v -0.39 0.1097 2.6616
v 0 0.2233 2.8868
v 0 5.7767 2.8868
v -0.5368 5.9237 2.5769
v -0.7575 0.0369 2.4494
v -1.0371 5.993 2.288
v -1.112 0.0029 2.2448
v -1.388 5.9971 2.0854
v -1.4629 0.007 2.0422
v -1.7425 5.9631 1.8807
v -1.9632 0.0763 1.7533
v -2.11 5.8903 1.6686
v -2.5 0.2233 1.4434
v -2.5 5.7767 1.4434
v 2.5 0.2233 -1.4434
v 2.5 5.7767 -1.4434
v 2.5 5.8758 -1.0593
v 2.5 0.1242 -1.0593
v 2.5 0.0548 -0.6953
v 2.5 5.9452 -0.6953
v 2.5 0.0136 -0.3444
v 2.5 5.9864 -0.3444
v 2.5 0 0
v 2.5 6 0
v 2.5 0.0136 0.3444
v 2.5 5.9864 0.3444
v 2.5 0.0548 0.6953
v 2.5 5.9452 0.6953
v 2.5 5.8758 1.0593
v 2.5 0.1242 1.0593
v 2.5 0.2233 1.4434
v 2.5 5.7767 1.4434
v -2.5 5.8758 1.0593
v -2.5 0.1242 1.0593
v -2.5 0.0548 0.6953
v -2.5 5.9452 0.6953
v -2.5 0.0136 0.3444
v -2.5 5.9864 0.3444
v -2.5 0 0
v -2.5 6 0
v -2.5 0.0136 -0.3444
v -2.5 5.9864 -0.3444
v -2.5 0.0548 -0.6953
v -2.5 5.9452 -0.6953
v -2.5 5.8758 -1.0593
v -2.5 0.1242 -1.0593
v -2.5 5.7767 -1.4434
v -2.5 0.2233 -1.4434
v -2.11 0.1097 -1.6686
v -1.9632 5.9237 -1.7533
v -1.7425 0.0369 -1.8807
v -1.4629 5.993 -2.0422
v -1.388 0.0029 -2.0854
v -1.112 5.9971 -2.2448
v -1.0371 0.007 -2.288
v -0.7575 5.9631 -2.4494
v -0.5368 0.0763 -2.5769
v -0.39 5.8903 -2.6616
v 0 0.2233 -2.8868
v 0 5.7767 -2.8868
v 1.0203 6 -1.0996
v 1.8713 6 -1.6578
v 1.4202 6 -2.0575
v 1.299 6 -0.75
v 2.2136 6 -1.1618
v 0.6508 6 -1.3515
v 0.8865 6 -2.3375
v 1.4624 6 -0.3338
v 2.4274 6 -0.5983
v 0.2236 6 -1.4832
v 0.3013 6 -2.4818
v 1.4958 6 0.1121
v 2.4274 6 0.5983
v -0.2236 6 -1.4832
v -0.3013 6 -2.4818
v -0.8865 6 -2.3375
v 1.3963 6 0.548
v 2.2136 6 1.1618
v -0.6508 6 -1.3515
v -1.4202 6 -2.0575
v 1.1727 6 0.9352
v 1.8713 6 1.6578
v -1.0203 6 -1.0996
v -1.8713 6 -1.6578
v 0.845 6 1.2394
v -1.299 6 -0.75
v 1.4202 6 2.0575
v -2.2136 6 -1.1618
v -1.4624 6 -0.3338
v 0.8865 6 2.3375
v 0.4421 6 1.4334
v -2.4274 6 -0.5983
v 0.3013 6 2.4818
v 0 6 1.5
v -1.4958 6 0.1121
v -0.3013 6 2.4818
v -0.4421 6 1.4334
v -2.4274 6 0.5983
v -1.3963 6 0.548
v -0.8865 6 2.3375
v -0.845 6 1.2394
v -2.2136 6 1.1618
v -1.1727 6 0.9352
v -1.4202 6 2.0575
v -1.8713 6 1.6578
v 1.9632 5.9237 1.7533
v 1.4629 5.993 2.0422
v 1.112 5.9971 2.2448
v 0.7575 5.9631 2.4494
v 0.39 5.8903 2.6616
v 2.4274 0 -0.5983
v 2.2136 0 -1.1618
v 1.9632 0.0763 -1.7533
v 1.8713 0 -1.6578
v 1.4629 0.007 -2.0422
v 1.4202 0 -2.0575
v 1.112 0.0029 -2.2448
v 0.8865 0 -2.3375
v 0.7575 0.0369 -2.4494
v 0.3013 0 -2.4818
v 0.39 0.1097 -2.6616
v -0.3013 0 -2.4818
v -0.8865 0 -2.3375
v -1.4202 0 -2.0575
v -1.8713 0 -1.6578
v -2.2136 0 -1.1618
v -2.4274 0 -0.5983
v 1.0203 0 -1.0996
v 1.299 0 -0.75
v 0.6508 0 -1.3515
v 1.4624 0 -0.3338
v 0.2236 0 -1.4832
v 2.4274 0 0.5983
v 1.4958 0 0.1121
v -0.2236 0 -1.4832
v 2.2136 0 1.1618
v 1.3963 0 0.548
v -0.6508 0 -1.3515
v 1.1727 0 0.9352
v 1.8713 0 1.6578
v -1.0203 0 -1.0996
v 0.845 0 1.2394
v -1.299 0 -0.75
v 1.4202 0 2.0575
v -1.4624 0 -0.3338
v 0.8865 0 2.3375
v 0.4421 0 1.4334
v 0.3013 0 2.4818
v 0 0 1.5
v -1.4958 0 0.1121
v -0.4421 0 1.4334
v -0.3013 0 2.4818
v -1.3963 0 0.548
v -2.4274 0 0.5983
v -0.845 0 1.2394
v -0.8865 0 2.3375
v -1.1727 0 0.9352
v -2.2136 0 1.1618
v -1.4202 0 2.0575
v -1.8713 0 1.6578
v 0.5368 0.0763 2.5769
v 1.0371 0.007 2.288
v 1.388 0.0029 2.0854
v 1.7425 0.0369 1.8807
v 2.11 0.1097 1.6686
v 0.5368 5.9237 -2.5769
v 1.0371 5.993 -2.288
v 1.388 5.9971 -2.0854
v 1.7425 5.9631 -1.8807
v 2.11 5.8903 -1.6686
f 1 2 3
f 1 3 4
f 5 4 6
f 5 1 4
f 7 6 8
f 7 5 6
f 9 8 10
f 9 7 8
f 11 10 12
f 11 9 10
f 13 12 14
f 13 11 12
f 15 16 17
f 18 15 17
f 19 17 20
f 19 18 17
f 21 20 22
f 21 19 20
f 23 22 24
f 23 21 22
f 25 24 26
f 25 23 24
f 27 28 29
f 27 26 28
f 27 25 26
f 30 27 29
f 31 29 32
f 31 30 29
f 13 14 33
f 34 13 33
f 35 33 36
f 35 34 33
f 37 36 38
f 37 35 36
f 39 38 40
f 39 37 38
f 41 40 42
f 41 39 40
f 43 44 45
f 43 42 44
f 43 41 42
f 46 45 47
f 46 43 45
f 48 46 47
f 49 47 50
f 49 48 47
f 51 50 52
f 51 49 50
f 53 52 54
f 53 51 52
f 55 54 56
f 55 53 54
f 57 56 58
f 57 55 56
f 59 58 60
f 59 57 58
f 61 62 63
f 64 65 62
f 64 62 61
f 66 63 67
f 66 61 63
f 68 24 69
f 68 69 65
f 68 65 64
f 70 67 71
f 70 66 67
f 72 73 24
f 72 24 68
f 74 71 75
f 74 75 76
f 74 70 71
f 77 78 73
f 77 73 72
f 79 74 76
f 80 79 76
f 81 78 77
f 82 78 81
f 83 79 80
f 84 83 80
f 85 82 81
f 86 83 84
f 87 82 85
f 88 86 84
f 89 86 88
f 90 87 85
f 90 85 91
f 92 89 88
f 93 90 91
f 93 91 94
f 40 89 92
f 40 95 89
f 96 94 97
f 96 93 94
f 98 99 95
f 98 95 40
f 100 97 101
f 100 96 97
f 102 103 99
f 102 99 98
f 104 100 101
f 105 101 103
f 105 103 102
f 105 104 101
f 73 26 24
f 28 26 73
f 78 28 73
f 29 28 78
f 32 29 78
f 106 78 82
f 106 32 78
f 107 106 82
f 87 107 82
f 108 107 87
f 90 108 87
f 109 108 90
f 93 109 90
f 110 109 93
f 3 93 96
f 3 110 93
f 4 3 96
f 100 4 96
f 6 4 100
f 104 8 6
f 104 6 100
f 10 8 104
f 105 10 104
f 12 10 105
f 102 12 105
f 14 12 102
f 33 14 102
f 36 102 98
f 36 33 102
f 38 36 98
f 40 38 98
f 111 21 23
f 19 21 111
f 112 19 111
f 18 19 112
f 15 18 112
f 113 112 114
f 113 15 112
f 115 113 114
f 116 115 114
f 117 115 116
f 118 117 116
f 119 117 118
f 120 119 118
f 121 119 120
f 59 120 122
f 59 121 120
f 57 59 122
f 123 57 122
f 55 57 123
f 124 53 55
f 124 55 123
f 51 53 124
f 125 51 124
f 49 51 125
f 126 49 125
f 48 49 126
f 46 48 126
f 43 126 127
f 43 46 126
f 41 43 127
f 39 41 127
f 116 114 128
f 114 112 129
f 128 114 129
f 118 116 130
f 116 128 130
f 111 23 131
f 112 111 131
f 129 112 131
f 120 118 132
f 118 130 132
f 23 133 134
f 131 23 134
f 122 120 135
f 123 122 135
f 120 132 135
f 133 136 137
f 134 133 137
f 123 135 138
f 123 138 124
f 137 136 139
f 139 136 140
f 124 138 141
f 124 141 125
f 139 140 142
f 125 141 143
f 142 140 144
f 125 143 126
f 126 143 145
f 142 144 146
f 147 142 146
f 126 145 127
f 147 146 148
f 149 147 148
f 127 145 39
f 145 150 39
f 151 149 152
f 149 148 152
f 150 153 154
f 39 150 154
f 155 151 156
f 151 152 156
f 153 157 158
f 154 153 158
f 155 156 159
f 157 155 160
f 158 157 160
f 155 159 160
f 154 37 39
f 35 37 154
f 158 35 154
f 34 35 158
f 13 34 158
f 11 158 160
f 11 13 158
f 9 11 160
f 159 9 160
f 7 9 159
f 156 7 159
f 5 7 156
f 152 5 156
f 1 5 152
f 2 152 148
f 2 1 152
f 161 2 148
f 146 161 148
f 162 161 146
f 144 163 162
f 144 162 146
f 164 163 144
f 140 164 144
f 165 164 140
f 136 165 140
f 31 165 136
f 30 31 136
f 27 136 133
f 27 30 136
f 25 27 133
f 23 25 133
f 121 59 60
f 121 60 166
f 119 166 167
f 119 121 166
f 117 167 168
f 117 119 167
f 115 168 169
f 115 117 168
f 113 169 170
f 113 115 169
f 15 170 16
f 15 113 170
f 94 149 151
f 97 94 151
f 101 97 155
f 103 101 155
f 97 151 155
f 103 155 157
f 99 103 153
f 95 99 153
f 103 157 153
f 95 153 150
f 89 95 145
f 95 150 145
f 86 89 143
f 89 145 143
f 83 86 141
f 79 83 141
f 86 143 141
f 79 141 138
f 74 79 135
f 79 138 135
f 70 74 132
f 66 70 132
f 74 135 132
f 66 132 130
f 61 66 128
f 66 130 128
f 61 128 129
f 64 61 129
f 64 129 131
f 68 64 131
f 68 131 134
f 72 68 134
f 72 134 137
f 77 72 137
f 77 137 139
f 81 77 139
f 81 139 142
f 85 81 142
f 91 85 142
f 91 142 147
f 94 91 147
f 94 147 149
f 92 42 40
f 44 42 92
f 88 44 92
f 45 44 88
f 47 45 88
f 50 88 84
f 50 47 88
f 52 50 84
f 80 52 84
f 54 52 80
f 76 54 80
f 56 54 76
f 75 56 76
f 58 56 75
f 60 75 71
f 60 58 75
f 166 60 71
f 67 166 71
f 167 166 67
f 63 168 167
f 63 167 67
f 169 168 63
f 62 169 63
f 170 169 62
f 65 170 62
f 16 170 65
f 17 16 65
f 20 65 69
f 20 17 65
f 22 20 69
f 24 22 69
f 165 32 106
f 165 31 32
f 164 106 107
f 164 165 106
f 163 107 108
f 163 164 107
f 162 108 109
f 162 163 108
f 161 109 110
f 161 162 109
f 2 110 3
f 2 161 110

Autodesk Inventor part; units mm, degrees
ref_plane "YZ Plane" through (0, 0, 0) normal (1, 0, 0) x (0, 1, 0)
ref_plane "XZ Plane" through (0, 0, 0) normal (0, 1, 0) x (-1, 0, 0)
ref_plane "XY Plane" through (0, 0, 0) normal (0, 0, 1) x (1, 0, 0)
sketch "Sketch1" plane through (0, 0, 0) normal (0, 1, 0) x (-1, 0, 0)
  line L0 (0, -2.8868) -> (-2.5, -1.4434)
  line L1 (-2.5, -1.4434) -> (-2.5, 1.4434)
  line L2 (-2.5, 1.4434) -> (0, 2.8868)
  line L3 (0, 2.8868) -> (2.5, 1.4434)
  line L4 (2.5, 1.4434) -> (2.5, -1.4434)
  line L5 (2.5, -1.4434) -> (0, -2.8868)
  point P0 (0, 0)
  point P1 (0, 0)
  dimension "d0" = 5
extrude "Extrusion1" add sketch "Sketch1" along normal blind 6
sketch "Sketch2" plane through (0, 6, 0) normal (0, 1, 0) x (1, 0, 0)
  point P0 (0, 0)
  point P1 (0, 0)
hole "Hole1" at (0, 6, 0) direction (0, -1, 0) diameter 3 end through all
sketch "Sketch3" plane through (0, 0, 0) normal (0, 0, 1) x (1, 0, 0)
  line L0 (0, 6) -> (2.5, 6) projected
  line L1 (2.5, 6) -> (4.5, 6)
  line L2 (2.5, 6) -> (4.5, 4.8453)
  line L3 (2.5, 6) -> (4.8094, 6) construction
  line L4 (4.5, 4.8453) -> (4.5, 6)
  line L5 (2.5, 0) -> (2.5, 6) projected
  line L6 (2.5, 0) -> (4.5, 0)
  line L7 (2.5, 0) -> (4.5, 1.1547)
  line L8 (2.5, 0) -> (4.8094, 0) construction
  line L9 (4.5, 1.1547) -> (4.5, 0)
  line L10 (0, -1.6) -> (0, 9.6) projected
  point P0 (0, 0)
  dimension "d10" = 30
  dimension "d11" = 2
  dimension "d12" = 30
revolve "Revolution1" cut sketch "Sketch3" angle 360 about axis through (0, -10, 0) along (0, 1, 0)
properties part number "M3_H8.0mm_board_spacer" material "Nickel-Copper Alloy 400"
